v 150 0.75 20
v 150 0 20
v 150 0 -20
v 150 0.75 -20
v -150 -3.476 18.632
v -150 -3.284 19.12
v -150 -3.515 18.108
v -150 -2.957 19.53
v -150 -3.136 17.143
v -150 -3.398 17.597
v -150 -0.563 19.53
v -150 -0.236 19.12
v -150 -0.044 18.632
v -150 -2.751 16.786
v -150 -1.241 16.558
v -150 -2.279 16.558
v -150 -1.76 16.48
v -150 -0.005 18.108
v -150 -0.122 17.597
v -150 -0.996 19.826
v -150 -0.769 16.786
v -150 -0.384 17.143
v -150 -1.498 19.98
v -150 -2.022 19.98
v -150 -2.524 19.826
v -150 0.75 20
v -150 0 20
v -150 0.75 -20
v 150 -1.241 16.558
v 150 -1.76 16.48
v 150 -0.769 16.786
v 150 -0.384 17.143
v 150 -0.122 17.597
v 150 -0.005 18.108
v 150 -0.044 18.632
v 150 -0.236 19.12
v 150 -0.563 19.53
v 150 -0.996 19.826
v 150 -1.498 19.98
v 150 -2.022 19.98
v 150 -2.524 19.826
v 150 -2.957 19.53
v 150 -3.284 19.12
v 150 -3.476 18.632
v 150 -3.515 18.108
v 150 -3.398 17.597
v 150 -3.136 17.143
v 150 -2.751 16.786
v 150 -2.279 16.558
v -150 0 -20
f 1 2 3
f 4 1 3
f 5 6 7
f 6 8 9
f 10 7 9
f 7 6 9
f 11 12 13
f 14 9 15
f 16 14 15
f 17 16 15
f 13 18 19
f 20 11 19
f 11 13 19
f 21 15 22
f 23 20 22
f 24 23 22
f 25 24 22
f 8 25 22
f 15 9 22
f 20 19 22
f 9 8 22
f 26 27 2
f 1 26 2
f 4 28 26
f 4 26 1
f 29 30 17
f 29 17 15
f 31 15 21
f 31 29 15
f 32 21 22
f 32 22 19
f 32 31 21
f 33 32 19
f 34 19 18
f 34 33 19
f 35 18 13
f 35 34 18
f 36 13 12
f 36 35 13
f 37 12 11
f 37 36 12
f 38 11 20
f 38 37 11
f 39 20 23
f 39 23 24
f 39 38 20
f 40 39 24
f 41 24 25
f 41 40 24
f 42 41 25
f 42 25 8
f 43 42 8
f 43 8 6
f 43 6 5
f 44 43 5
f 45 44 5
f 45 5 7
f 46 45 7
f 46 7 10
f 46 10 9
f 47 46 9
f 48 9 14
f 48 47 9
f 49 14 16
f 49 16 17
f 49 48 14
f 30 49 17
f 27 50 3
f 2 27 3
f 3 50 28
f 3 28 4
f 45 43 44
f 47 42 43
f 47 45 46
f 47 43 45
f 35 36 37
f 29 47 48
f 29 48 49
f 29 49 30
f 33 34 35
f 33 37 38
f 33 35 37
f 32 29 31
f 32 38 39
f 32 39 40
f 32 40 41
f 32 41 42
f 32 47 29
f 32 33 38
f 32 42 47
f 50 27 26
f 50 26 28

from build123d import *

# Parameters (mm, degrees)
SKETCH1_W           = 300
SKETCH1_H           = 40
BASE_FLANGE1_DEPTH  = 0.75
SKETCH6_R           = 1.76
BOSS_EXTRUDE1_DEPTH = 300


# Sheet-metal steps are written as plain solids
with BuildPart() as part:
    # Sketch1 → Base-Flange1 (new body)
    with BuildSketch(Plane(origin=(0, 0, 0), x_dir=(1, 0, 0), z_dir=(0, 1, 0))):
        Rectangle(SKETCH1_W, SKETCH1_H)
    extrude(amount=BASE_FLANGE1_DEPTH)


with BuildPart() as body_2:
    # Sketch6 → Boss-Extrude1 (new body)
    with BuildSketch(Plane(origin=(150, 0, 0), x_dir=(0, 0, -1), z_dir=(1, 0, 0))):
        with Locations((-18.24, -1.76)):
            Circle(SKETCH6_R)
    extrude(amount=-BOSS_EXTRUDE1_DEPTH)


solid = Compound([part.part, body_2.part])
